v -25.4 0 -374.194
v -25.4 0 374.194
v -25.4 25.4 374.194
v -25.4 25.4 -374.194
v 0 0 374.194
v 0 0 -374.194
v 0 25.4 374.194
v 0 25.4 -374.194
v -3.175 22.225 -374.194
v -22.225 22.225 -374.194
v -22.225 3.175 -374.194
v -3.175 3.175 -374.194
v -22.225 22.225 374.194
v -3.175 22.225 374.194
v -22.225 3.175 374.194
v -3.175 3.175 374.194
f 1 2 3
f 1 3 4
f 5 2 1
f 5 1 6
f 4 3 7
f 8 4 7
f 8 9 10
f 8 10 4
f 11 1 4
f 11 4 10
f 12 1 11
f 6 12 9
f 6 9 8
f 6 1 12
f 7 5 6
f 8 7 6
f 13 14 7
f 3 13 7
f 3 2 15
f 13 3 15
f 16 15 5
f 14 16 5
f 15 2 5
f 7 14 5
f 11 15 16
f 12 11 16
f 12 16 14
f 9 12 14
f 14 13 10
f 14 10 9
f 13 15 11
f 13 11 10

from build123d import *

# Parameters (mm, degrees)
SKETCH1_W           = 25.4
SKETCH1_H           = 748.388181024
BOSS_EXTRUDE1_DEPTH = 25.4
SKETCH2_W           = 19.05
SKETCH2_H           = 19.05
CUT_EXTRUDE1_DEPTH  = 750.249751082


with BuildPart() as part:
    # Sketch1 → Boss-Extrude1 (new body)
    with BuildSketch(Plane(origin=(0, 0, 0), x_dir=(1, 0, 0), z_dir=(0, 1, 0))):
        with Locations((-12.7, 0)):
            Rectangle(SKETCH1_W, SKETCH1_H)
    extrude(amount=BOSS_EXTRUDE1_DEPTH)

    # Sketch2 → Cut-Extrude1 (cut, through all)
    with BuildSketch(Plane.XY.offset(374.194090512)):
        with Locations((-12.7, 12.7)):
            Rectangle(SKETCH2_W, SKETCH2_H)
    extrude(amount=-CUT_EXTRUDE1_DEPTH, mode=Mode.SUBTRACT)


solid = part.part
